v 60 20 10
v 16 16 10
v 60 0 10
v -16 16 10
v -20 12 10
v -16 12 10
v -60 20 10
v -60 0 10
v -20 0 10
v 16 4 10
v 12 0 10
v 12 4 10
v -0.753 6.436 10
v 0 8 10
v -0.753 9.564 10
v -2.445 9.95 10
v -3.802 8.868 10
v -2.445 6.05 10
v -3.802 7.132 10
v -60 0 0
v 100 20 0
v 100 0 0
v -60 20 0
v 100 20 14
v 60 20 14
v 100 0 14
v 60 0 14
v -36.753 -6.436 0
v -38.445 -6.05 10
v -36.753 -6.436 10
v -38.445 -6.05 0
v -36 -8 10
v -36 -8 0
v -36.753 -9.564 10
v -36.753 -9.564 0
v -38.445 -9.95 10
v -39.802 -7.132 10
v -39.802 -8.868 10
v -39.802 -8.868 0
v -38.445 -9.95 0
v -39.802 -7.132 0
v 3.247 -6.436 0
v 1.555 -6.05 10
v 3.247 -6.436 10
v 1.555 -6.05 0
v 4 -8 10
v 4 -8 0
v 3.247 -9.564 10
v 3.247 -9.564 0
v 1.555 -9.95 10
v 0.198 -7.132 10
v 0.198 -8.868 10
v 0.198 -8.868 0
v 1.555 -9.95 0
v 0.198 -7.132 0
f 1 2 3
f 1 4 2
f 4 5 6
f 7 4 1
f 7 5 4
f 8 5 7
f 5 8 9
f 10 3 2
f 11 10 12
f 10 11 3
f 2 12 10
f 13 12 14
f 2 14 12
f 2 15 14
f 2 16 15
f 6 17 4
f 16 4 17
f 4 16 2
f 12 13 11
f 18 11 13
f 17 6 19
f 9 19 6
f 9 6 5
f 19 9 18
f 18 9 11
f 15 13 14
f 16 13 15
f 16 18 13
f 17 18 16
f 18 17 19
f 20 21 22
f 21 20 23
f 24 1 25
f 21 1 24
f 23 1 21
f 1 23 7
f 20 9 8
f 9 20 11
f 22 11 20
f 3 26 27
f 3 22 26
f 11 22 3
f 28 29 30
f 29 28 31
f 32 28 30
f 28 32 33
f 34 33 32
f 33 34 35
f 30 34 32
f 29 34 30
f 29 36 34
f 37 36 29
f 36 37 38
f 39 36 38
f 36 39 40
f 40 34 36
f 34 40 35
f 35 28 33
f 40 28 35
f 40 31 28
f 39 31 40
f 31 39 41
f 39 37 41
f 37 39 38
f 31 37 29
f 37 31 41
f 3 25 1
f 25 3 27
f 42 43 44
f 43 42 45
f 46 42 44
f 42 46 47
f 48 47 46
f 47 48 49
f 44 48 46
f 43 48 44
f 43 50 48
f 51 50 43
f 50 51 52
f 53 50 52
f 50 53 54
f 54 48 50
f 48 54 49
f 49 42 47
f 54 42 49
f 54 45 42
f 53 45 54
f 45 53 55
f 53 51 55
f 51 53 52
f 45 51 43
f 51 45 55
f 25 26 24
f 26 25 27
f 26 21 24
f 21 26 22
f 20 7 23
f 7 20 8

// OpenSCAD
// Constants
block_width = 20; // Width of the block in millimeters
block_length = 40; // Length of the block in millimeters
block_height = 10; // Height of the block in millimeters
block_bump_size = 4; // Size of the bumps on top of the block in millimeters
block_hole_size = 4; // Diameter of the holes in the bottom of the block in millimeters

// Block shape
module block(shape="basic") {
  if (shape == "basic") {
    cube([block_length, block_width, block_height]);
  } else if (shape == "slant") {
    difference() {
      cube([block_length, block_width, block_height]);
      translate([0, 0, block_height]) {
        cube([block_length - block_bump_size * 2, block_width - block_bump_size * 2, block_bump_size]);
        translate([block_bump_size, block_bump_size, 0]) {
          cube([block_length - block_bump_size * 2, block_width - block_bump_size * 2, block_bump_size]);
        }
      }
    }
    translate([block_length/2 - block_hole_size/2, block_width/2 - block_hole_size/2, 0]) {
      cylinder(r=block_hole_size/2, h=block_height);
    }
    translate([-(block_length/2 - block_hole_size/2), -(block_width/2 - block_hole_size/2), 0]) {
      cylinder(r=block_hole_size/2, h=block_height);
    }
  } else if (shape == "hole") {
    cube([block_length, block_width, block_height]);
    translate([block_length/2 - block_hole_size/2, block_width/2 - block_hole_size/2, 0]) {
      cylinder(r=block_hole_size/2, h=block_height);
    }
    translate([-(block_length/2 - block_hole_size/2), -(block_width/2 - block_hole_size/2), 0]) {
      cylinder(r=block_hole_size/2, h=block_height);
    }
  } else if (shape == "bump") {
    cube([block_length, block_width, block_height + block_bump_size]);
    translate([0, 0, block_height]) {
      cube([block_length - block_bump_size * 2, block_width - block_bump_size * 2, block_bump_size]);
      translate([block_bump_size, block_bump_size, 0]) {
        cube([block_length - block_bump_size * 2, block_width - block_bump_size * 2, block_bump_size]);
      }
    }
  }
}

// Example blocks
translate([-60, 0, 0]) {
  block("basic");
}
translate([-20, 0, 0]) {
  block("slant");
}
translate([20, 0, 0]) {
  block("hole");
}
translate([60, 0, 0]) {
  block("bump");
}
